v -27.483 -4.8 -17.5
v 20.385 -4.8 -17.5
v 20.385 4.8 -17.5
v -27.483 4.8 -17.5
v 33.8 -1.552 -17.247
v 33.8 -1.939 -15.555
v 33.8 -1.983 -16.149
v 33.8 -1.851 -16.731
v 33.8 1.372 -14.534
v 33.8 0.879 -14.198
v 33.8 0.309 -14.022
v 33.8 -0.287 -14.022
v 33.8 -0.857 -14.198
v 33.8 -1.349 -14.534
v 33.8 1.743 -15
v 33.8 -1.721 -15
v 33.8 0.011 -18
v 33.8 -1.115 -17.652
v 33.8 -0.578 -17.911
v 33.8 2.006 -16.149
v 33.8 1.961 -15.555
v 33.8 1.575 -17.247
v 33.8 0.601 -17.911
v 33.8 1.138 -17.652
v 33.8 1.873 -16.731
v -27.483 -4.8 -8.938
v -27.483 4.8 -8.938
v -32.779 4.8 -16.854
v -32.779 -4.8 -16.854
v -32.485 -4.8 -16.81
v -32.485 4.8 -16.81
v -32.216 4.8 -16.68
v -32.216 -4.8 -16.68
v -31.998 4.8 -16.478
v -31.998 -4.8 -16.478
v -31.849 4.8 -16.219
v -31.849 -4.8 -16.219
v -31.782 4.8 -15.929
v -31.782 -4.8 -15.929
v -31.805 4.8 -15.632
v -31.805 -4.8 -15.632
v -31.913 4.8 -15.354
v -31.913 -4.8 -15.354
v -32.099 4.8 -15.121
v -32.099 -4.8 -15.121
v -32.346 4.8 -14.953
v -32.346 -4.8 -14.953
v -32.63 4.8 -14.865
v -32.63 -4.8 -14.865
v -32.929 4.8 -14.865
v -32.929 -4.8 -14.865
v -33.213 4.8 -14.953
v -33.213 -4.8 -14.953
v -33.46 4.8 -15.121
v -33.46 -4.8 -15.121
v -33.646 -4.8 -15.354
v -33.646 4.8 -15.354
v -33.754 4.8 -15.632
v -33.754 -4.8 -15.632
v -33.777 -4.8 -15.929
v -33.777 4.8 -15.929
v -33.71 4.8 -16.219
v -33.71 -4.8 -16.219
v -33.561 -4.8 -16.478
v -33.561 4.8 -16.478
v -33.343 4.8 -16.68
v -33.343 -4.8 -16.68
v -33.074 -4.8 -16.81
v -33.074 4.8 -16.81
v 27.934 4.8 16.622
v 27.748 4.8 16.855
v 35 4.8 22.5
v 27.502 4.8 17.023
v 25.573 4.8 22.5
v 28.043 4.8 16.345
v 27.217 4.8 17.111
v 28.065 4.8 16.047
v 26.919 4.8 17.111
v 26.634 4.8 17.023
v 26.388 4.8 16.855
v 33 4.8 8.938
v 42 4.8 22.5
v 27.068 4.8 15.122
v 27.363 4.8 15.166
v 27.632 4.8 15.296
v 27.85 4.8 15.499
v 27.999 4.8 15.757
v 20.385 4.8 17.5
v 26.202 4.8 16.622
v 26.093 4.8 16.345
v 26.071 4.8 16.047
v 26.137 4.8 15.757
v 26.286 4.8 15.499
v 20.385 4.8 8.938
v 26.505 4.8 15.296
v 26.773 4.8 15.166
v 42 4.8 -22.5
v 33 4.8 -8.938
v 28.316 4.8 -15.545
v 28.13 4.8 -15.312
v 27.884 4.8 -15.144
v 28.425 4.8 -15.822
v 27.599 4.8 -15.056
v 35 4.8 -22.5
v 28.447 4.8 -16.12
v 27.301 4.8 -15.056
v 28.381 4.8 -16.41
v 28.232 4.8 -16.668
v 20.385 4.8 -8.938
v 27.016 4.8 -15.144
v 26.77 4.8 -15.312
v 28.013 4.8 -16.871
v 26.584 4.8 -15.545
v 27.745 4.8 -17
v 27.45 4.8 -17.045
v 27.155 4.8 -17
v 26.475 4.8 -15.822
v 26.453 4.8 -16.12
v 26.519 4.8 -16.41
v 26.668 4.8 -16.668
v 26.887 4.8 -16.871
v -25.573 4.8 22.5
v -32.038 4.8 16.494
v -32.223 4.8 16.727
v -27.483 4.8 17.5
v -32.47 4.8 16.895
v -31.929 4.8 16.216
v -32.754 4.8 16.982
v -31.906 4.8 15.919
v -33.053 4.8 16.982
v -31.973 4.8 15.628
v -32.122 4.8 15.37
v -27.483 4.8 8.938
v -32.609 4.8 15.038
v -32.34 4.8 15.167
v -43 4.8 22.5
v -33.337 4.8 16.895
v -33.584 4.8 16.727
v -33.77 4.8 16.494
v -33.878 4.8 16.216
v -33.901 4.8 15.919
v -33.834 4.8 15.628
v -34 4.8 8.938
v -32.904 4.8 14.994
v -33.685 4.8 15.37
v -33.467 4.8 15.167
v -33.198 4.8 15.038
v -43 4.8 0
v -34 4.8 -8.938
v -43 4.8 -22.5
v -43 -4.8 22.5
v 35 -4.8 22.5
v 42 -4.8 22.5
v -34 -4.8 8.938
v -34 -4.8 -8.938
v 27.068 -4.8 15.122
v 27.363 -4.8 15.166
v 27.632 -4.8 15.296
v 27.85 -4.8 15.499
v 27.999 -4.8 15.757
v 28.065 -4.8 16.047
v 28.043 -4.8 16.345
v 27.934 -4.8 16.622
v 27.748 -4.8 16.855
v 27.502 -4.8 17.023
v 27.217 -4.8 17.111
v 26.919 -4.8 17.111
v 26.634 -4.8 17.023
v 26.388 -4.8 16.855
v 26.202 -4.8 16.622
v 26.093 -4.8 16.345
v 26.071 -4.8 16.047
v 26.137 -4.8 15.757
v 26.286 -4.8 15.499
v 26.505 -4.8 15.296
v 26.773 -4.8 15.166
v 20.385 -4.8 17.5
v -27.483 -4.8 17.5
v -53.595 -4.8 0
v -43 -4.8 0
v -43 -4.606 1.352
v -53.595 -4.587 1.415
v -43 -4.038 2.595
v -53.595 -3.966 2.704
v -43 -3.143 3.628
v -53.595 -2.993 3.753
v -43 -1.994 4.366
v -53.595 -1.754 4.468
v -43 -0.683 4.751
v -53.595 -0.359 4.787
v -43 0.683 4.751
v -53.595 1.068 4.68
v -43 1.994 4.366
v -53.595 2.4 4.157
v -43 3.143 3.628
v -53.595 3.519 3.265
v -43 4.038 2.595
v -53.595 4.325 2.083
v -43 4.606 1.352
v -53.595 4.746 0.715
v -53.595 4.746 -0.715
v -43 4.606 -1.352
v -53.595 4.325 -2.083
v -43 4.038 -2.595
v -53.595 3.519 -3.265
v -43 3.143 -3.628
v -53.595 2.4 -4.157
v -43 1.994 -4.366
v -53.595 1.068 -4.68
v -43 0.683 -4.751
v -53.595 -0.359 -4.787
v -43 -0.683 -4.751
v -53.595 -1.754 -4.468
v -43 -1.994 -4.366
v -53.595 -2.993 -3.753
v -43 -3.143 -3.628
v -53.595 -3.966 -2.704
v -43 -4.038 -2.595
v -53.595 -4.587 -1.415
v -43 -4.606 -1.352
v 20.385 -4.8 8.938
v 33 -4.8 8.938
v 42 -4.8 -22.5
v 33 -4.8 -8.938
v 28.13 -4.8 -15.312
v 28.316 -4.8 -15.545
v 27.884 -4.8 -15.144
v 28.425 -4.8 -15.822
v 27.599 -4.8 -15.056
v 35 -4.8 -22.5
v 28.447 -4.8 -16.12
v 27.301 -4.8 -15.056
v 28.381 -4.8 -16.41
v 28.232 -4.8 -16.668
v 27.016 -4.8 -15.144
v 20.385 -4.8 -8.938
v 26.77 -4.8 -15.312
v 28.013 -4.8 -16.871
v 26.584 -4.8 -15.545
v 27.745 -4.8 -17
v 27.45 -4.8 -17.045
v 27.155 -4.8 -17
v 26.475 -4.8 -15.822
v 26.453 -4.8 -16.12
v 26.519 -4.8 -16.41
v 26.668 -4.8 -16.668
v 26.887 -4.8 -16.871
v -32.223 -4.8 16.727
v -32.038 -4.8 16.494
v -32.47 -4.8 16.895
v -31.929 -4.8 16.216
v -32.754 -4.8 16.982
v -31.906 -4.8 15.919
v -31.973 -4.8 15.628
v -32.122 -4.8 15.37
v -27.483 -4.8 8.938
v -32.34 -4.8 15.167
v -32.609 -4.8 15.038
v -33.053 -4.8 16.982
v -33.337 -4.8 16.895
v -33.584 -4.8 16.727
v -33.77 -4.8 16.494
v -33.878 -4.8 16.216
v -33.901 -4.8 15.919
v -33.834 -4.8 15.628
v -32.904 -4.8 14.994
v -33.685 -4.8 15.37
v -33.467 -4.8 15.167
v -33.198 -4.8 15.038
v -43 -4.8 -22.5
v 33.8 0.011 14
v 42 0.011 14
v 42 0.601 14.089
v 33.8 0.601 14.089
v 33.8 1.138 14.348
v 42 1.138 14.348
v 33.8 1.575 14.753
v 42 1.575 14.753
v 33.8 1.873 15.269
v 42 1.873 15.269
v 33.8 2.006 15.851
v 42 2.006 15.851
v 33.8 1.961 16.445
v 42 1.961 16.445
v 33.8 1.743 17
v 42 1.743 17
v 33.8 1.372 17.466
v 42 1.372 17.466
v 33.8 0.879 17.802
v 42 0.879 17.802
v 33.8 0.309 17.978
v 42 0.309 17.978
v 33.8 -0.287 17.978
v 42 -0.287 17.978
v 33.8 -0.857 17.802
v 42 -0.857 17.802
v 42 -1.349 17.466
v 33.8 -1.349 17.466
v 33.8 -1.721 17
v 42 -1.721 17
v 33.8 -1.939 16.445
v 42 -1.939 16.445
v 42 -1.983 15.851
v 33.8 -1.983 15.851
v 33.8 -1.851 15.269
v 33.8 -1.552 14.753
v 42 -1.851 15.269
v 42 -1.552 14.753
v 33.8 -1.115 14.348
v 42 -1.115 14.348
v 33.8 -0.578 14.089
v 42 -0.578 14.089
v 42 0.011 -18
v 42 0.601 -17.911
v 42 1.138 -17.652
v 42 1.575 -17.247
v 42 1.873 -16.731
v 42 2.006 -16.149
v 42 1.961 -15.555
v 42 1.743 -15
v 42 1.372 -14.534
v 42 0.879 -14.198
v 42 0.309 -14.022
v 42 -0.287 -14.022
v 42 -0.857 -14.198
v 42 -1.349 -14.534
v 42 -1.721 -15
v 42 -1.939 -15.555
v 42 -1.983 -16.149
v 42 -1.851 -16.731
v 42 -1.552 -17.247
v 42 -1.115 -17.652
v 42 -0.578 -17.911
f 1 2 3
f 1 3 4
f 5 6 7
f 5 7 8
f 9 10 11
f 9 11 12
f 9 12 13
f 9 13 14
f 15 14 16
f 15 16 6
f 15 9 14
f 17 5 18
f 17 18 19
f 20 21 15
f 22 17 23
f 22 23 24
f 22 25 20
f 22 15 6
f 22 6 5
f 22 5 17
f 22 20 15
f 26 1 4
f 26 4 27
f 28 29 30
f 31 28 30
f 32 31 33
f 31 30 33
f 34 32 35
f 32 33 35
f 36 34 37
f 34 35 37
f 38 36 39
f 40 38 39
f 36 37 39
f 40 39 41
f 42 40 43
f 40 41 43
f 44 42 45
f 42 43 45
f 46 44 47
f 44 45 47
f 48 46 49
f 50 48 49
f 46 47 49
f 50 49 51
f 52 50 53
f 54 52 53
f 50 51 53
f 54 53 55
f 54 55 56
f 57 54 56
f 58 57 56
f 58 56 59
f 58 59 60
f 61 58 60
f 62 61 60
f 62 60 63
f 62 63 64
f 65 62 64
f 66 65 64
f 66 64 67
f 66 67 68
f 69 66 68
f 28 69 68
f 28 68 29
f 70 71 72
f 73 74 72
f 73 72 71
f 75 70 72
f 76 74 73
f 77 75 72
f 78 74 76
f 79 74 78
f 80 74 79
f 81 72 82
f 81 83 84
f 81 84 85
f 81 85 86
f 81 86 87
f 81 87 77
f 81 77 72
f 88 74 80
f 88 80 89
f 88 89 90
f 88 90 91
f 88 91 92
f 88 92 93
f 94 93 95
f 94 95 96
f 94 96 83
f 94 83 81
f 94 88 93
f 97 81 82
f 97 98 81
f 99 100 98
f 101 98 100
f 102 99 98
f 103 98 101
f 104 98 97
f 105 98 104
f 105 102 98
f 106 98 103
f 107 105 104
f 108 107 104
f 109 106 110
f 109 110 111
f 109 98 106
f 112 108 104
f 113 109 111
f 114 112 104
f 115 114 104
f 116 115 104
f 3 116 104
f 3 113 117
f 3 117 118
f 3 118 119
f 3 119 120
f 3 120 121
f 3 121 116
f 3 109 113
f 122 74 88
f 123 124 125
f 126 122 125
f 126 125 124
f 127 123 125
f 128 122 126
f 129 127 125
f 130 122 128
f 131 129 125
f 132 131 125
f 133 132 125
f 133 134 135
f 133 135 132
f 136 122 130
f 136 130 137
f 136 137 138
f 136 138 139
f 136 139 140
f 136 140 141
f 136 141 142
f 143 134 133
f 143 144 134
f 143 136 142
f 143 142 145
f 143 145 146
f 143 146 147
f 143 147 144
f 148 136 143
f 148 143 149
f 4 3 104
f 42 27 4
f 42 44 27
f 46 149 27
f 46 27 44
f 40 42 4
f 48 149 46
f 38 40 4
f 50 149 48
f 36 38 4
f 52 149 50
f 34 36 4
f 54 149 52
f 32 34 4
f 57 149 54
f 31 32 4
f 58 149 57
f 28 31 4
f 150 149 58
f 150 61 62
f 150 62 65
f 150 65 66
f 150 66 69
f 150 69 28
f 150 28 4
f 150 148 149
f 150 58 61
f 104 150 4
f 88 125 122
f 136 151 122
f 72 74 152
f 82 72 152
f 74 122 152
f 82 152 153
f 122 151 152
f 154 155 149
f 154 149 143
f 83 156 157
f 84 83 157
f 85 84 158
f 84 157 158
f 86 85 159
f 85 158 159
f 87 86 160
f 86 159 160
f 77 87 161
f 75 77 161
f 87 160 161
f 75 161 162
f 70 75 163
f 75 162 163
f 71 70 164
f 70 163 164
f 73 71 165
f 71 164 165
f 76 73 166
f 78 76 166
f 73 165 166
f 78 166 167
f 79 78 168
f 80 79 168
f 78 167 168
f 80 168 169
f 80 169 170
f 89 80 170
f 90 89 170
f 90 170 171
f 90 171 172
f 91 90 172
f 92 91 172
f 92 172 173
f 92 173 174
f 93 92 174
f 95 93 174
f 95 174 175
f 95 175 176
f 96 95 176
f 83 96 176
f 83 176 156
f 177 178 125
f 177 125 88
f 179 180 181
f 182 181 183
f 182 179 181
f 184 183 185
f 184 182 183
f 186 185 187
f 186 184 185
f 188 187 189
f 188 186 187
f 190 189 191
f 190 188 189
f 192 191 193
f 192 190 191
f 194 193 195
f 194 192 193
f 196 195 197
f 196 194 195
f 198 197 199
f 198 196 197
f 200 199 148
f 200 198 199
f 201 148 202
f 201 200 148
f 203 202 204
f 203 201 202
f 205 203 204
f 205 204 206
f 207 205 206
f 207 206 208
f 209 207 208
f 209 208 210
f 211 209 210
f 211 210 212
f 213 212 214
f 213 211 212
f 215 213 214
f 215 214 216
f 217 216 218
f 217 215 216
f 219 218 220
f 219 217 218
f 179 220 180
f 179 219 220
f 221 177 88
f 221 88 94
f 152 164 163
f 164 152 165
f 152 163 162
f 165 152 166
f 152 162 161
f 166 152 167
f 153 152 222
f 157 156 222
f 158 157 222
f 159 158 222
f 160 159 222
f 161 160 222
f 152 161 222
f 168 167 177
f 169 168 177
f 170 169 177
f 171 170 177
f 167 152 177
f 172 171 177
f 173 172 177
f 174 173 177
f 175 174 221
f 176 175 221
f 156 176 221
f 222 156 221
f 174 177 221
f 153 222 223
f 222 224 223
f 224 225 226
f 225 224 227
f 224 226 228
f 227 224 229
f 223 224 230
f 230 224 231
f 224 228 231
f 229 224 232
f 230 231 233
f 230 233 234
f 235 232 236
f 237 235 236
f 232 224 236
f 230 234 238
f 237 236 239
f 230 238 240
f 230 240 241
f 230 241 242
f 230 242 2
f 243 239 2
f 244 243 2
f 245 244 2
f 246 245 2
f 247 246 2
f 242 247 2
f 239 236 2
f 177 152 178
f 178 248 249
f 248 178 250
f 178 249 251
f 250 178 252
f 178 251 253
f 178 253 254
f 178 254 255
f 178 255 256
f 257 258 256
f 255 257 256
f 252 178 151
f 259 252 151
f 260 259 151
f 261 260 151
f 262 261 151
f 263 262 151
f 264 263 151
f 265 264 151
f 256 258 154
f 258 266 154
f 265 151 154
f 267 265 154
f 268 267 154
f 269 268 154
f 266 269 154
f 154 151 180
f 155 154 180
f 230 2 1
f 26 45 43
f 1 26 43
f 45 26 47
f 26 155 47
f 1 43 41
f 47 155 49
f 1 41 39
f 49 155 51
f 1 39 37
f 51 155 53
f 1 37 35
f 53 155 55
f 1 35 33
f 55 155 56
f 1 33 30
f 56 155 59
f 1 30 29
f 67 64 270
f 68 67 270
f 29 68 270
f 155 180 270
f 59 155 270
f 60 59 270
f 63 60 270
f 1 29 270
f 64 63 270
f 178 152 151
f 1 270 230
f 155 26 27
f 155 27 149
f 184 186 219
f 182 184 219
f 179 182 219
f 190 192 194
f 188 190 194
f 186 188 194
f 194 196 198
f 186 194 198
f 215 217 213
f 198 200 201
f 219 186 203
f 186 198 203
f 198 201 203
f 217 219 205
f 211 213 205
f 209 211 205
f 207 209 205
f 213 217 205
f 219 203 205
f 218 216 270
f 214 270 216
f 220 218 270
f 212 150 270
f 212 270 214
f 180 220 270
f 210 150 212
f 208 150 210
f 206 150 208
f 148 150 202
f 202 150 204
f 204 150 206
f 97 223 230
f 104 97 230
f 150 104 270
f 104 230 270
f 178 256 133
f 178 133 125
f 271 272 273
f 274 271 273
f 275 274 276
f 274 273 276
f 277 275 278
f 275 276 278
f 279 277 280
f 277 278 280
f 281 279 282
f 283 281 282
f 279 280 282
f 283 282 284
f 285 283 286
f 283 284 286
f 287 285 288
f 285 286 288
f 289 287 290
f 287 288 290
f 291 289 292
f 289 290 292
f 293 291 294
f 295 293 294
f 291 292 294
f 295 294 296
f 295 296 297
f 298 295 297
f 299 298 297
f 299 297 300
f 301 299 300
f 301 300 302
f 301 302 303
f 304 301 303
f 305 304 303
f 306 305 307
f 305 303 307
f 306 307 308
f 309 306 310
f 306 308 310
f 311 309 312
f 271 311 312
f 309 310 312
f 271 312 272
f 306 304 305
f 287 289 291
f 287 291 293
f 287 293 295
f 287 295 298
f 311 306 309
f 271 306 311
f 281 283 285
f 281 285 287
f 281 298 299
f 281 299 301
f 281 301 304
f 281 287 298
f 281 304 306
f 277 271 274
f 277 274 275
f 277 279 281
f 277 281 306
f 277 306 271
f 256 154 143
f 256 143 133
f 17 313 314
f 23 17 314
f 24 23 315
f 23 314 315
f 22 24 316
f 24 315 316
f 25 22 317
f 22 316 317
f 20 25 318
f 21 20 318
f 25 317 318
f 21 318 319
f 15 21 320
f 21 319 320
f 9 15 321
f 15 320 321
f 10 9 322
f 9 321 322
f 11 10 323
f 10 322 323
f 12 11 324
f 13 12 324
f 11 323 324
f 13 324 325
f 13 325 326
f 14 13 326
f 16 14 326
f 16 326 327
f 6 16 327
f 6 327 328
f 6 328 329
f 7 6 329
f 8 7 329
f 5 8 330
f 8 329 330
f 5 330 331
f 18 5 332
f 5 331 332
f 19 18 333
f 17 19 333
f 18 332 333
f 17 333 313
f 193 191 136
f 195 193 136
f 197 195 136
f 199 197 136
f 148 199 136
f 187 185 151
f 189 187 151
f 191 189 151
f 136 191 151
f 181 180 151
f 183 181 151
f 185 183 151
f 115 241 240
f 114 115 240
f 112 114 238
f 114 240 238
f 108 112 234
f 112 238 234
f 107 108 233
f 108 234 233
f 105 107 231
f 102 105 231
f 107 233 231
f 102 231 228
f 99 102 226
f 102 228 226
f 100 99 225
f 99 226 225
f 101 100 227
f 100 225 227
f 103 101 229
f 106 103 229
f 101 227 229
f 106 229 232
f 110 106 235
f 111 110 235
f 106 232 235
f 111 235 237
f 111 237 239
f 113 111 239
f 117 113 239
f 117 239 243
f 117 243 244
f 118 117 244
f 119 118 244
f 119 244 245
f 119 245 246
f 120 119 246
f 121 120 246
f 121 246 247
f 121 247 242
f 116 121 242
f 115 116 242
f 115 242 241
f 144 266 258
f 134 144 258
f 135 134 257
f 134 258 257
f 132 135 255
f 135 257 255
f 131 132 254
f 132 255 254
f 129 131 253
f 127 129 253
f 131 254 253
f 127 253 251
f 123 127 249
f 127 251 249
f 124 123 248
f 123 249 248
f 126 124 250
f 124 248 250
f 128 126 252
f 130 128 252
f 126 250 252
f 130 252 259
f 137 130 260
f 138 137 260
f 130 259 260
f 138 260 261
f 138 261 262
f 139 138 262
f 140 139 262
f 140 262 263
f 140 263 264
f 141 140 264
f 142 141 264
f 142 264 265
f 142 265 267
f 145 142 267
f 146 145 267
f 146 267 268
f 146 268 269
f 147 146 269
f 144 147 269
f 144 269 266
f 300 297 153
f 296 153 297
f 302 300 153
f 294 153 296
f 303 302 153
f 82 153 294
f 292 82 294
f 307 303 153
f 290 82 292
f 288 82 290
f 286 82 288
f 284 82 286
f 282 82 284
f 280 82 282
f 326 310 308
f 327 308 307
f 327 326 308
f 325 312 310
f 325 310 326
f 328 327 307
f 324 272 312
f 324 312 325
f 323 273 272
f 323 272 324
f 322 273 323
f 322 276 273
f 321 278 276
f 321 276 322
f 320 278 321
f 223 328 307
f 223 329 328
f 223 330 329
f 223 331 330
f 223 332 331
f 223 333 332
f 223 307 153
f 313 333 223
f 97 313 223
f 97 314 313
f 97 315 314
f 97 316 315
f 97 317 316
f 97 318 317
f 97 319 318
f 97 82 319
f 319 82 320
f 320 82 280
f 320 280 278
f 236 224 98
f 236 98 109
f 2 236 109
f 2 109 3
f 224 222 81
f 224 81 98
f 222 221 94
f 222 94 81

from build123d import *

# Parameters (mm, degrees)
SKETCH8_R               = 35
BOSS_EXTRUDE3_DEPTH     = 1
BOSS_EXTRUDE4_START     = -53.594889
SKETCH9_R               = 5
BOSS_EXTRUDE4_DEPTH     = 113.594889
CUT_EXTRUDE2_START      = -20.791267
SKETCH10_R              = 4
CUT_EXTRUDE2_DEPTH      = 20.791267
SKETCH11_R              = 1.5
CUT_EXTRUDE3_DEPTH      = 73.971936727
BOSS_EXTRUDE5_REACH     = 74.567
SKETCH13_W              = 88.883012554
SKETCH13_H              = 5.53578549
CUT_EXTRUDE4_DEPTH      = 110.338922716
SKETCH14_R              = 1
CUT_EXTRUDE5_DEPTH      = 71.019198384
SKETCH15_W              = 75.166178786
SKETCH15_H              = 0.46421451
SKETCH15_W_2            = 75.463979311
CUT_EXTRUDE6_DEPTH      = 109.72955086
CUT_EXTRUDE7_DEPTH      = 109.707210391
CUT_EXTRUDE7_DEPTH_BACK = 109.707210391
SKETCH16_W              = 74.883691919
SKETCH16_H              = 0.2
SKETCH17_W              = 45
SKETCH17_H              = 9.670623623
CUT_EXTRUDE8_DEPTH      = 25
SKETCH18_W              = 45.166247069
SKETCH18_H              = 9.6
BOSS_EXTRUDE6_DEPTH     = 7
SKETCH19_R              = 2
CUT_EXTRUDE9_DEPTH      = 8.2
SKETCH20_W              = 85
SKETCH20_H              = 13.048799846
SKETCH20_W_2            = 85.000162577
SKETCH20_H_2            = 13.925318183
CUT_EXTRUDE10_DEPTH     = 9.6
CUT_EXTRUDE11_DEPTH     = 59.913683698
SKETCH22_R              = 5
SKETCH22_R_2            = 4.8
CUT_EXTRUDE12_DEPTH     = 10.594889107


with BuildPart() as part:
    # Sketch1 → Revolve1 (revolve)
    with BuildSketch(Plane.XY):
        with BuildLine():
            Line((-32.912878475, 10), (-22.912878475, 10))
            ThreePointArc((-22.912878475, 10), (-25, 0), (-22.912878475, -10))
            Line((-22.912878475, -10), (-32.912878475, -10))
            ThreePointArc((-32.912878475, -10), (-34.398511152, 0), (-32.912878475, 10))
        make_face()
    revolve(axis=Axis((0, 0, 0), (0, 1, 0)))

    # Sketch8 → Boss-Extrude3 (add)
    with BuildSketch(Plane.XZ.offset(10)):
        with Locations(Location((0, 0, 0), (0, 0, 270))):
            Circle(SKETCH8_R)
    extrude(amount=BOSS_EXTRUDE3_DEPTH)

    # Sketch9 → Boss-Extrude4 (add)
    with BuildSketch(Plane(origin=(0, 0, 0), x_dir=(0, 0, -1), z_dir=(1, 0, 0)).offset(BOSS_EXTRUDE4_START)):
        Circle(SKETCH9_R)
    extrude(amount=BOSS_EXTRUDE4_DEPTH)

    # Sketch10 → Cut-Extrude2 (cut)
    with BuildSketch(Plane(origin=(60, 0, 0), x_dir=(0, 0, -1), z_dir=(1, 0, 0)).offset(CUT_EXTRUDE2_START)):
        Circle(SKETCH10_R)
    extrude(amount=CUT_EXTRUDE2_DEPTH, mode=Mode.SUBTRACT)

    # Sketch11 → Cut-Extrude3 (cut, through all)
    with BuildSketch(Plane(origin=(0, 0.188776478, -4.996435073), x_dir=(-1, 0, 0), z_dir=(0, 0.03775529554410709, -0.9992870146551377))):
        with Locations(Location((-55, 0, 0), (0, 0, 90))):
            Circle(SKETCH11_R)
    extrude(amount=-CUT_EXTRUDE3_DEPTH, mode=Mode.SUBTRACT)

    # Boss-Extrude5: up to this face of the body (flat: up to its plane)
    boss_extrude5_end = Plane(part.part.faces().sort_by_distance((31.981961692, 10, 0))[0])
    # Sketch12 → Boss-Extrude5 (add, up to the picked face)
    with BuildSketch(Plane.XZ.offset(11), mode=Mode.PRIVATE) as boss_extrude5_sk1:
        Polygon((-43, -22.5), (-43, 22.5), (-16.841508162, 22.5), (-16.841508162, 28.986561578), (16.841508162, 28.986561578), (16.841508162, 22.5), (35, 22.5), (35, -22.5), (16.384759584, -22.5), (16.384759584, -28.901286862), (-16.384759584, -28.901286862), (-16.384759584, -22.5), align=None)
    boss_extrude5_tool1 = split(extrude(boss_extrude5_sk1.sketch, amount=-BOSS_EXTRUDE5_REACH, mode=Mode.PRIVATE), bisect_by=boss_extrude5_end, keep=Keep.BOTH, mode=Mode.PRIVATE)
    add(boss_extrude5_tool1.solids().sort_by(Axis((-3.565032, -11, 0.05927), (0, 1, 0)))[0])

    # Sketch13 → Cut-Extrude4 (cut, through all)
    with BuildSketch(Plane.ZY.offset(43)):
        with Locations((0, -8.232107255)):
            Rectangle(SKETCH13_W, SKETCH13_H)
        with Locations((0, 8.232107255)):
            Rectangle(SKETCH13_W, SKETCH13_H)
    extrude(amount=-CUT_EXTRUDE4_DEPTH, mode=Mode.SUBTRACT)

    # Sketch14 → Cut-Extrude5 (cut, through all)
    with BuildSketch(Plane.XZ.offset(5.46421451)):
        with Locations(Location((-32.903541804, 15.993560443, 0), (0, 0, 270))):
            Circle(SKETCH14_R)
        with Locations(Location((-32.779476251, -15.854024353, 0), (0, 0, 270))):
            Circle(SKETCH14_R)
        with Locations(Location((27.068192394, 16.122002754, 0), (0, 0, 270))):
            Circle(SKETCH14_R)
        with Locations(Location((27.449995703, -16.044926007, 0), (0, 0, 270))):
            Circle(SKETCH14_R)
    extrude(amount=-CUT_EXTRUDE5_DEPTH, mode=Mode.SUBTRACT)

    # Sketch15 → Cut-Extrude6 (cut, through all)
    with BuildSketch(Plane.ZY.offset(43)):
        with Locations((-0.380582347, 5.232107255)):
            Rectangle(SKETCH15_W, SKETCH15_H)
        with Locations((0.06827951, -5.232107255)):
            Rectangle(SKETCH15_W_2, SKETCH15_H)
    extrude(amount=-CUT_EXTRUDE6_DEPTH, mode=Mode.SUBTRACT)

    # Sketch16 → Cut-Extrude7 (cut, two sides: drawn at the far end of the back side and taken through both)
    with BuildSketch(Plane.ZY.offset(43).offset(-CUT_EXTRUDE7_DEPTH_BACK)):
        with Locations((-0.578270867, 4.9)):
            Rectangle(SKETCH16_W, SKETCH16_H)
        with Locations((-0.578270867, -4.9)):
            Rectangle(SKETCH16_W, SKETCH16_H)
    extrude(amount=CUT_EXTRUDE7_DEPTH + CUT_EXTRUDE7_DEPTH_BACK, mode=Mode.SUBTRACT)

    # Sketch17 → Cut-Extrude8 (cut)
    with BuildSketch(Plane(origin=(35, 0, 0), x_dir=(0, 0, -1), z_dir=(1, 0, 0))):
        with Locations((0, 0.035311811)):
            Rectangle(SKETCH17_W, SKETCH17_H)
    extrude(amount=CUT_EXTRUDE8_DEPTH, mode=Mode.SUBTRACT)

    # Sketch18 → Boss-Extrude6 (add)
    with BuildSketch(Plane(origin=(35, 0, 0), x_dir=(0, 0, -1), z_dir=(1, 0, 0))):
        with Locations((-0.083123535, 0)):
            Rectangle(SKETCH18_W, SKETCH18_H)
    extrude(amount=BOSS_EXTRUDE6_DEPTH)

    # Sketch19 → Cut-Extrude9 (cut)
    with BuildSketch(Plane(origin=(42, 0, 0), x_dir=(0, 0, -1), z_dir=(1, 0, 0))):
        with Locations((-16, 0.011242039)):
            Circle(SKETCH19_R)
        with Locations((16, 0.011242039)):
            Circle(SKETCH19_R)
    extrude(amount=-CUT_EXTRUDE9_DEPTH, mode=Mode.SUBTRACT)

    # Sketch20 → Cut-Extrude10 (cut)
    with BuildSketch(Plane(origin=(0, 4.8, 0), x_dir=(1, 0, 0), z_dir=(0, 1, 0))):
        with Locations((-0.5, 29.024399923)):
            Rectangle(SKETCH20_W, SKETCH20_H)
        with Locations((-0.499918711, -29.462659092)):
            Rectangle(SKETCH20_W_2, SKETCH20_H_2)
    extrude(amount=-CUT_EXTRUDE10_DEPTH, mode=Mode.SUBTRACT)

    # Sketch21 → Cut-Extrude11 (cut, through all)
    with BuildSketch(Plane.XZ.offset(4.8)):
        Polygon((-34, -8.937993072), (-34, 8.937993072), (-27.4832705, 8.937993072), (-27.4832705, 17.5), (20.384920046, 17.5), (20.384920046, 8.937993072), (33, 8.937993072), (33, -8.937993072), (20.384920046, -8.937993072), (20.384920046, -17.5), (-27.4832705, -17.5), (-27.4832705, -8.937993072), align=None)
    extrude(amount=-CUT_EXTRUDE11_DEPTH, mode=Mode.SUBTRACT)

    # Sketch22 → Cut-Extrude12 (cut)
    with BuildSketch(Plane.ZY.offset(53.594889107)):
        Circle(SKETCH22_R)
        with Locations(Location((0, 0, 0), (0, 0, 270))):
            Circle(SKETCH22_R_2, mode=Mode.SUBTRACT)
    extrude(amount=-CUT_EXTRUDE12_DEPTH, mode=Mode.SUBTRACT)


solid = part.part
